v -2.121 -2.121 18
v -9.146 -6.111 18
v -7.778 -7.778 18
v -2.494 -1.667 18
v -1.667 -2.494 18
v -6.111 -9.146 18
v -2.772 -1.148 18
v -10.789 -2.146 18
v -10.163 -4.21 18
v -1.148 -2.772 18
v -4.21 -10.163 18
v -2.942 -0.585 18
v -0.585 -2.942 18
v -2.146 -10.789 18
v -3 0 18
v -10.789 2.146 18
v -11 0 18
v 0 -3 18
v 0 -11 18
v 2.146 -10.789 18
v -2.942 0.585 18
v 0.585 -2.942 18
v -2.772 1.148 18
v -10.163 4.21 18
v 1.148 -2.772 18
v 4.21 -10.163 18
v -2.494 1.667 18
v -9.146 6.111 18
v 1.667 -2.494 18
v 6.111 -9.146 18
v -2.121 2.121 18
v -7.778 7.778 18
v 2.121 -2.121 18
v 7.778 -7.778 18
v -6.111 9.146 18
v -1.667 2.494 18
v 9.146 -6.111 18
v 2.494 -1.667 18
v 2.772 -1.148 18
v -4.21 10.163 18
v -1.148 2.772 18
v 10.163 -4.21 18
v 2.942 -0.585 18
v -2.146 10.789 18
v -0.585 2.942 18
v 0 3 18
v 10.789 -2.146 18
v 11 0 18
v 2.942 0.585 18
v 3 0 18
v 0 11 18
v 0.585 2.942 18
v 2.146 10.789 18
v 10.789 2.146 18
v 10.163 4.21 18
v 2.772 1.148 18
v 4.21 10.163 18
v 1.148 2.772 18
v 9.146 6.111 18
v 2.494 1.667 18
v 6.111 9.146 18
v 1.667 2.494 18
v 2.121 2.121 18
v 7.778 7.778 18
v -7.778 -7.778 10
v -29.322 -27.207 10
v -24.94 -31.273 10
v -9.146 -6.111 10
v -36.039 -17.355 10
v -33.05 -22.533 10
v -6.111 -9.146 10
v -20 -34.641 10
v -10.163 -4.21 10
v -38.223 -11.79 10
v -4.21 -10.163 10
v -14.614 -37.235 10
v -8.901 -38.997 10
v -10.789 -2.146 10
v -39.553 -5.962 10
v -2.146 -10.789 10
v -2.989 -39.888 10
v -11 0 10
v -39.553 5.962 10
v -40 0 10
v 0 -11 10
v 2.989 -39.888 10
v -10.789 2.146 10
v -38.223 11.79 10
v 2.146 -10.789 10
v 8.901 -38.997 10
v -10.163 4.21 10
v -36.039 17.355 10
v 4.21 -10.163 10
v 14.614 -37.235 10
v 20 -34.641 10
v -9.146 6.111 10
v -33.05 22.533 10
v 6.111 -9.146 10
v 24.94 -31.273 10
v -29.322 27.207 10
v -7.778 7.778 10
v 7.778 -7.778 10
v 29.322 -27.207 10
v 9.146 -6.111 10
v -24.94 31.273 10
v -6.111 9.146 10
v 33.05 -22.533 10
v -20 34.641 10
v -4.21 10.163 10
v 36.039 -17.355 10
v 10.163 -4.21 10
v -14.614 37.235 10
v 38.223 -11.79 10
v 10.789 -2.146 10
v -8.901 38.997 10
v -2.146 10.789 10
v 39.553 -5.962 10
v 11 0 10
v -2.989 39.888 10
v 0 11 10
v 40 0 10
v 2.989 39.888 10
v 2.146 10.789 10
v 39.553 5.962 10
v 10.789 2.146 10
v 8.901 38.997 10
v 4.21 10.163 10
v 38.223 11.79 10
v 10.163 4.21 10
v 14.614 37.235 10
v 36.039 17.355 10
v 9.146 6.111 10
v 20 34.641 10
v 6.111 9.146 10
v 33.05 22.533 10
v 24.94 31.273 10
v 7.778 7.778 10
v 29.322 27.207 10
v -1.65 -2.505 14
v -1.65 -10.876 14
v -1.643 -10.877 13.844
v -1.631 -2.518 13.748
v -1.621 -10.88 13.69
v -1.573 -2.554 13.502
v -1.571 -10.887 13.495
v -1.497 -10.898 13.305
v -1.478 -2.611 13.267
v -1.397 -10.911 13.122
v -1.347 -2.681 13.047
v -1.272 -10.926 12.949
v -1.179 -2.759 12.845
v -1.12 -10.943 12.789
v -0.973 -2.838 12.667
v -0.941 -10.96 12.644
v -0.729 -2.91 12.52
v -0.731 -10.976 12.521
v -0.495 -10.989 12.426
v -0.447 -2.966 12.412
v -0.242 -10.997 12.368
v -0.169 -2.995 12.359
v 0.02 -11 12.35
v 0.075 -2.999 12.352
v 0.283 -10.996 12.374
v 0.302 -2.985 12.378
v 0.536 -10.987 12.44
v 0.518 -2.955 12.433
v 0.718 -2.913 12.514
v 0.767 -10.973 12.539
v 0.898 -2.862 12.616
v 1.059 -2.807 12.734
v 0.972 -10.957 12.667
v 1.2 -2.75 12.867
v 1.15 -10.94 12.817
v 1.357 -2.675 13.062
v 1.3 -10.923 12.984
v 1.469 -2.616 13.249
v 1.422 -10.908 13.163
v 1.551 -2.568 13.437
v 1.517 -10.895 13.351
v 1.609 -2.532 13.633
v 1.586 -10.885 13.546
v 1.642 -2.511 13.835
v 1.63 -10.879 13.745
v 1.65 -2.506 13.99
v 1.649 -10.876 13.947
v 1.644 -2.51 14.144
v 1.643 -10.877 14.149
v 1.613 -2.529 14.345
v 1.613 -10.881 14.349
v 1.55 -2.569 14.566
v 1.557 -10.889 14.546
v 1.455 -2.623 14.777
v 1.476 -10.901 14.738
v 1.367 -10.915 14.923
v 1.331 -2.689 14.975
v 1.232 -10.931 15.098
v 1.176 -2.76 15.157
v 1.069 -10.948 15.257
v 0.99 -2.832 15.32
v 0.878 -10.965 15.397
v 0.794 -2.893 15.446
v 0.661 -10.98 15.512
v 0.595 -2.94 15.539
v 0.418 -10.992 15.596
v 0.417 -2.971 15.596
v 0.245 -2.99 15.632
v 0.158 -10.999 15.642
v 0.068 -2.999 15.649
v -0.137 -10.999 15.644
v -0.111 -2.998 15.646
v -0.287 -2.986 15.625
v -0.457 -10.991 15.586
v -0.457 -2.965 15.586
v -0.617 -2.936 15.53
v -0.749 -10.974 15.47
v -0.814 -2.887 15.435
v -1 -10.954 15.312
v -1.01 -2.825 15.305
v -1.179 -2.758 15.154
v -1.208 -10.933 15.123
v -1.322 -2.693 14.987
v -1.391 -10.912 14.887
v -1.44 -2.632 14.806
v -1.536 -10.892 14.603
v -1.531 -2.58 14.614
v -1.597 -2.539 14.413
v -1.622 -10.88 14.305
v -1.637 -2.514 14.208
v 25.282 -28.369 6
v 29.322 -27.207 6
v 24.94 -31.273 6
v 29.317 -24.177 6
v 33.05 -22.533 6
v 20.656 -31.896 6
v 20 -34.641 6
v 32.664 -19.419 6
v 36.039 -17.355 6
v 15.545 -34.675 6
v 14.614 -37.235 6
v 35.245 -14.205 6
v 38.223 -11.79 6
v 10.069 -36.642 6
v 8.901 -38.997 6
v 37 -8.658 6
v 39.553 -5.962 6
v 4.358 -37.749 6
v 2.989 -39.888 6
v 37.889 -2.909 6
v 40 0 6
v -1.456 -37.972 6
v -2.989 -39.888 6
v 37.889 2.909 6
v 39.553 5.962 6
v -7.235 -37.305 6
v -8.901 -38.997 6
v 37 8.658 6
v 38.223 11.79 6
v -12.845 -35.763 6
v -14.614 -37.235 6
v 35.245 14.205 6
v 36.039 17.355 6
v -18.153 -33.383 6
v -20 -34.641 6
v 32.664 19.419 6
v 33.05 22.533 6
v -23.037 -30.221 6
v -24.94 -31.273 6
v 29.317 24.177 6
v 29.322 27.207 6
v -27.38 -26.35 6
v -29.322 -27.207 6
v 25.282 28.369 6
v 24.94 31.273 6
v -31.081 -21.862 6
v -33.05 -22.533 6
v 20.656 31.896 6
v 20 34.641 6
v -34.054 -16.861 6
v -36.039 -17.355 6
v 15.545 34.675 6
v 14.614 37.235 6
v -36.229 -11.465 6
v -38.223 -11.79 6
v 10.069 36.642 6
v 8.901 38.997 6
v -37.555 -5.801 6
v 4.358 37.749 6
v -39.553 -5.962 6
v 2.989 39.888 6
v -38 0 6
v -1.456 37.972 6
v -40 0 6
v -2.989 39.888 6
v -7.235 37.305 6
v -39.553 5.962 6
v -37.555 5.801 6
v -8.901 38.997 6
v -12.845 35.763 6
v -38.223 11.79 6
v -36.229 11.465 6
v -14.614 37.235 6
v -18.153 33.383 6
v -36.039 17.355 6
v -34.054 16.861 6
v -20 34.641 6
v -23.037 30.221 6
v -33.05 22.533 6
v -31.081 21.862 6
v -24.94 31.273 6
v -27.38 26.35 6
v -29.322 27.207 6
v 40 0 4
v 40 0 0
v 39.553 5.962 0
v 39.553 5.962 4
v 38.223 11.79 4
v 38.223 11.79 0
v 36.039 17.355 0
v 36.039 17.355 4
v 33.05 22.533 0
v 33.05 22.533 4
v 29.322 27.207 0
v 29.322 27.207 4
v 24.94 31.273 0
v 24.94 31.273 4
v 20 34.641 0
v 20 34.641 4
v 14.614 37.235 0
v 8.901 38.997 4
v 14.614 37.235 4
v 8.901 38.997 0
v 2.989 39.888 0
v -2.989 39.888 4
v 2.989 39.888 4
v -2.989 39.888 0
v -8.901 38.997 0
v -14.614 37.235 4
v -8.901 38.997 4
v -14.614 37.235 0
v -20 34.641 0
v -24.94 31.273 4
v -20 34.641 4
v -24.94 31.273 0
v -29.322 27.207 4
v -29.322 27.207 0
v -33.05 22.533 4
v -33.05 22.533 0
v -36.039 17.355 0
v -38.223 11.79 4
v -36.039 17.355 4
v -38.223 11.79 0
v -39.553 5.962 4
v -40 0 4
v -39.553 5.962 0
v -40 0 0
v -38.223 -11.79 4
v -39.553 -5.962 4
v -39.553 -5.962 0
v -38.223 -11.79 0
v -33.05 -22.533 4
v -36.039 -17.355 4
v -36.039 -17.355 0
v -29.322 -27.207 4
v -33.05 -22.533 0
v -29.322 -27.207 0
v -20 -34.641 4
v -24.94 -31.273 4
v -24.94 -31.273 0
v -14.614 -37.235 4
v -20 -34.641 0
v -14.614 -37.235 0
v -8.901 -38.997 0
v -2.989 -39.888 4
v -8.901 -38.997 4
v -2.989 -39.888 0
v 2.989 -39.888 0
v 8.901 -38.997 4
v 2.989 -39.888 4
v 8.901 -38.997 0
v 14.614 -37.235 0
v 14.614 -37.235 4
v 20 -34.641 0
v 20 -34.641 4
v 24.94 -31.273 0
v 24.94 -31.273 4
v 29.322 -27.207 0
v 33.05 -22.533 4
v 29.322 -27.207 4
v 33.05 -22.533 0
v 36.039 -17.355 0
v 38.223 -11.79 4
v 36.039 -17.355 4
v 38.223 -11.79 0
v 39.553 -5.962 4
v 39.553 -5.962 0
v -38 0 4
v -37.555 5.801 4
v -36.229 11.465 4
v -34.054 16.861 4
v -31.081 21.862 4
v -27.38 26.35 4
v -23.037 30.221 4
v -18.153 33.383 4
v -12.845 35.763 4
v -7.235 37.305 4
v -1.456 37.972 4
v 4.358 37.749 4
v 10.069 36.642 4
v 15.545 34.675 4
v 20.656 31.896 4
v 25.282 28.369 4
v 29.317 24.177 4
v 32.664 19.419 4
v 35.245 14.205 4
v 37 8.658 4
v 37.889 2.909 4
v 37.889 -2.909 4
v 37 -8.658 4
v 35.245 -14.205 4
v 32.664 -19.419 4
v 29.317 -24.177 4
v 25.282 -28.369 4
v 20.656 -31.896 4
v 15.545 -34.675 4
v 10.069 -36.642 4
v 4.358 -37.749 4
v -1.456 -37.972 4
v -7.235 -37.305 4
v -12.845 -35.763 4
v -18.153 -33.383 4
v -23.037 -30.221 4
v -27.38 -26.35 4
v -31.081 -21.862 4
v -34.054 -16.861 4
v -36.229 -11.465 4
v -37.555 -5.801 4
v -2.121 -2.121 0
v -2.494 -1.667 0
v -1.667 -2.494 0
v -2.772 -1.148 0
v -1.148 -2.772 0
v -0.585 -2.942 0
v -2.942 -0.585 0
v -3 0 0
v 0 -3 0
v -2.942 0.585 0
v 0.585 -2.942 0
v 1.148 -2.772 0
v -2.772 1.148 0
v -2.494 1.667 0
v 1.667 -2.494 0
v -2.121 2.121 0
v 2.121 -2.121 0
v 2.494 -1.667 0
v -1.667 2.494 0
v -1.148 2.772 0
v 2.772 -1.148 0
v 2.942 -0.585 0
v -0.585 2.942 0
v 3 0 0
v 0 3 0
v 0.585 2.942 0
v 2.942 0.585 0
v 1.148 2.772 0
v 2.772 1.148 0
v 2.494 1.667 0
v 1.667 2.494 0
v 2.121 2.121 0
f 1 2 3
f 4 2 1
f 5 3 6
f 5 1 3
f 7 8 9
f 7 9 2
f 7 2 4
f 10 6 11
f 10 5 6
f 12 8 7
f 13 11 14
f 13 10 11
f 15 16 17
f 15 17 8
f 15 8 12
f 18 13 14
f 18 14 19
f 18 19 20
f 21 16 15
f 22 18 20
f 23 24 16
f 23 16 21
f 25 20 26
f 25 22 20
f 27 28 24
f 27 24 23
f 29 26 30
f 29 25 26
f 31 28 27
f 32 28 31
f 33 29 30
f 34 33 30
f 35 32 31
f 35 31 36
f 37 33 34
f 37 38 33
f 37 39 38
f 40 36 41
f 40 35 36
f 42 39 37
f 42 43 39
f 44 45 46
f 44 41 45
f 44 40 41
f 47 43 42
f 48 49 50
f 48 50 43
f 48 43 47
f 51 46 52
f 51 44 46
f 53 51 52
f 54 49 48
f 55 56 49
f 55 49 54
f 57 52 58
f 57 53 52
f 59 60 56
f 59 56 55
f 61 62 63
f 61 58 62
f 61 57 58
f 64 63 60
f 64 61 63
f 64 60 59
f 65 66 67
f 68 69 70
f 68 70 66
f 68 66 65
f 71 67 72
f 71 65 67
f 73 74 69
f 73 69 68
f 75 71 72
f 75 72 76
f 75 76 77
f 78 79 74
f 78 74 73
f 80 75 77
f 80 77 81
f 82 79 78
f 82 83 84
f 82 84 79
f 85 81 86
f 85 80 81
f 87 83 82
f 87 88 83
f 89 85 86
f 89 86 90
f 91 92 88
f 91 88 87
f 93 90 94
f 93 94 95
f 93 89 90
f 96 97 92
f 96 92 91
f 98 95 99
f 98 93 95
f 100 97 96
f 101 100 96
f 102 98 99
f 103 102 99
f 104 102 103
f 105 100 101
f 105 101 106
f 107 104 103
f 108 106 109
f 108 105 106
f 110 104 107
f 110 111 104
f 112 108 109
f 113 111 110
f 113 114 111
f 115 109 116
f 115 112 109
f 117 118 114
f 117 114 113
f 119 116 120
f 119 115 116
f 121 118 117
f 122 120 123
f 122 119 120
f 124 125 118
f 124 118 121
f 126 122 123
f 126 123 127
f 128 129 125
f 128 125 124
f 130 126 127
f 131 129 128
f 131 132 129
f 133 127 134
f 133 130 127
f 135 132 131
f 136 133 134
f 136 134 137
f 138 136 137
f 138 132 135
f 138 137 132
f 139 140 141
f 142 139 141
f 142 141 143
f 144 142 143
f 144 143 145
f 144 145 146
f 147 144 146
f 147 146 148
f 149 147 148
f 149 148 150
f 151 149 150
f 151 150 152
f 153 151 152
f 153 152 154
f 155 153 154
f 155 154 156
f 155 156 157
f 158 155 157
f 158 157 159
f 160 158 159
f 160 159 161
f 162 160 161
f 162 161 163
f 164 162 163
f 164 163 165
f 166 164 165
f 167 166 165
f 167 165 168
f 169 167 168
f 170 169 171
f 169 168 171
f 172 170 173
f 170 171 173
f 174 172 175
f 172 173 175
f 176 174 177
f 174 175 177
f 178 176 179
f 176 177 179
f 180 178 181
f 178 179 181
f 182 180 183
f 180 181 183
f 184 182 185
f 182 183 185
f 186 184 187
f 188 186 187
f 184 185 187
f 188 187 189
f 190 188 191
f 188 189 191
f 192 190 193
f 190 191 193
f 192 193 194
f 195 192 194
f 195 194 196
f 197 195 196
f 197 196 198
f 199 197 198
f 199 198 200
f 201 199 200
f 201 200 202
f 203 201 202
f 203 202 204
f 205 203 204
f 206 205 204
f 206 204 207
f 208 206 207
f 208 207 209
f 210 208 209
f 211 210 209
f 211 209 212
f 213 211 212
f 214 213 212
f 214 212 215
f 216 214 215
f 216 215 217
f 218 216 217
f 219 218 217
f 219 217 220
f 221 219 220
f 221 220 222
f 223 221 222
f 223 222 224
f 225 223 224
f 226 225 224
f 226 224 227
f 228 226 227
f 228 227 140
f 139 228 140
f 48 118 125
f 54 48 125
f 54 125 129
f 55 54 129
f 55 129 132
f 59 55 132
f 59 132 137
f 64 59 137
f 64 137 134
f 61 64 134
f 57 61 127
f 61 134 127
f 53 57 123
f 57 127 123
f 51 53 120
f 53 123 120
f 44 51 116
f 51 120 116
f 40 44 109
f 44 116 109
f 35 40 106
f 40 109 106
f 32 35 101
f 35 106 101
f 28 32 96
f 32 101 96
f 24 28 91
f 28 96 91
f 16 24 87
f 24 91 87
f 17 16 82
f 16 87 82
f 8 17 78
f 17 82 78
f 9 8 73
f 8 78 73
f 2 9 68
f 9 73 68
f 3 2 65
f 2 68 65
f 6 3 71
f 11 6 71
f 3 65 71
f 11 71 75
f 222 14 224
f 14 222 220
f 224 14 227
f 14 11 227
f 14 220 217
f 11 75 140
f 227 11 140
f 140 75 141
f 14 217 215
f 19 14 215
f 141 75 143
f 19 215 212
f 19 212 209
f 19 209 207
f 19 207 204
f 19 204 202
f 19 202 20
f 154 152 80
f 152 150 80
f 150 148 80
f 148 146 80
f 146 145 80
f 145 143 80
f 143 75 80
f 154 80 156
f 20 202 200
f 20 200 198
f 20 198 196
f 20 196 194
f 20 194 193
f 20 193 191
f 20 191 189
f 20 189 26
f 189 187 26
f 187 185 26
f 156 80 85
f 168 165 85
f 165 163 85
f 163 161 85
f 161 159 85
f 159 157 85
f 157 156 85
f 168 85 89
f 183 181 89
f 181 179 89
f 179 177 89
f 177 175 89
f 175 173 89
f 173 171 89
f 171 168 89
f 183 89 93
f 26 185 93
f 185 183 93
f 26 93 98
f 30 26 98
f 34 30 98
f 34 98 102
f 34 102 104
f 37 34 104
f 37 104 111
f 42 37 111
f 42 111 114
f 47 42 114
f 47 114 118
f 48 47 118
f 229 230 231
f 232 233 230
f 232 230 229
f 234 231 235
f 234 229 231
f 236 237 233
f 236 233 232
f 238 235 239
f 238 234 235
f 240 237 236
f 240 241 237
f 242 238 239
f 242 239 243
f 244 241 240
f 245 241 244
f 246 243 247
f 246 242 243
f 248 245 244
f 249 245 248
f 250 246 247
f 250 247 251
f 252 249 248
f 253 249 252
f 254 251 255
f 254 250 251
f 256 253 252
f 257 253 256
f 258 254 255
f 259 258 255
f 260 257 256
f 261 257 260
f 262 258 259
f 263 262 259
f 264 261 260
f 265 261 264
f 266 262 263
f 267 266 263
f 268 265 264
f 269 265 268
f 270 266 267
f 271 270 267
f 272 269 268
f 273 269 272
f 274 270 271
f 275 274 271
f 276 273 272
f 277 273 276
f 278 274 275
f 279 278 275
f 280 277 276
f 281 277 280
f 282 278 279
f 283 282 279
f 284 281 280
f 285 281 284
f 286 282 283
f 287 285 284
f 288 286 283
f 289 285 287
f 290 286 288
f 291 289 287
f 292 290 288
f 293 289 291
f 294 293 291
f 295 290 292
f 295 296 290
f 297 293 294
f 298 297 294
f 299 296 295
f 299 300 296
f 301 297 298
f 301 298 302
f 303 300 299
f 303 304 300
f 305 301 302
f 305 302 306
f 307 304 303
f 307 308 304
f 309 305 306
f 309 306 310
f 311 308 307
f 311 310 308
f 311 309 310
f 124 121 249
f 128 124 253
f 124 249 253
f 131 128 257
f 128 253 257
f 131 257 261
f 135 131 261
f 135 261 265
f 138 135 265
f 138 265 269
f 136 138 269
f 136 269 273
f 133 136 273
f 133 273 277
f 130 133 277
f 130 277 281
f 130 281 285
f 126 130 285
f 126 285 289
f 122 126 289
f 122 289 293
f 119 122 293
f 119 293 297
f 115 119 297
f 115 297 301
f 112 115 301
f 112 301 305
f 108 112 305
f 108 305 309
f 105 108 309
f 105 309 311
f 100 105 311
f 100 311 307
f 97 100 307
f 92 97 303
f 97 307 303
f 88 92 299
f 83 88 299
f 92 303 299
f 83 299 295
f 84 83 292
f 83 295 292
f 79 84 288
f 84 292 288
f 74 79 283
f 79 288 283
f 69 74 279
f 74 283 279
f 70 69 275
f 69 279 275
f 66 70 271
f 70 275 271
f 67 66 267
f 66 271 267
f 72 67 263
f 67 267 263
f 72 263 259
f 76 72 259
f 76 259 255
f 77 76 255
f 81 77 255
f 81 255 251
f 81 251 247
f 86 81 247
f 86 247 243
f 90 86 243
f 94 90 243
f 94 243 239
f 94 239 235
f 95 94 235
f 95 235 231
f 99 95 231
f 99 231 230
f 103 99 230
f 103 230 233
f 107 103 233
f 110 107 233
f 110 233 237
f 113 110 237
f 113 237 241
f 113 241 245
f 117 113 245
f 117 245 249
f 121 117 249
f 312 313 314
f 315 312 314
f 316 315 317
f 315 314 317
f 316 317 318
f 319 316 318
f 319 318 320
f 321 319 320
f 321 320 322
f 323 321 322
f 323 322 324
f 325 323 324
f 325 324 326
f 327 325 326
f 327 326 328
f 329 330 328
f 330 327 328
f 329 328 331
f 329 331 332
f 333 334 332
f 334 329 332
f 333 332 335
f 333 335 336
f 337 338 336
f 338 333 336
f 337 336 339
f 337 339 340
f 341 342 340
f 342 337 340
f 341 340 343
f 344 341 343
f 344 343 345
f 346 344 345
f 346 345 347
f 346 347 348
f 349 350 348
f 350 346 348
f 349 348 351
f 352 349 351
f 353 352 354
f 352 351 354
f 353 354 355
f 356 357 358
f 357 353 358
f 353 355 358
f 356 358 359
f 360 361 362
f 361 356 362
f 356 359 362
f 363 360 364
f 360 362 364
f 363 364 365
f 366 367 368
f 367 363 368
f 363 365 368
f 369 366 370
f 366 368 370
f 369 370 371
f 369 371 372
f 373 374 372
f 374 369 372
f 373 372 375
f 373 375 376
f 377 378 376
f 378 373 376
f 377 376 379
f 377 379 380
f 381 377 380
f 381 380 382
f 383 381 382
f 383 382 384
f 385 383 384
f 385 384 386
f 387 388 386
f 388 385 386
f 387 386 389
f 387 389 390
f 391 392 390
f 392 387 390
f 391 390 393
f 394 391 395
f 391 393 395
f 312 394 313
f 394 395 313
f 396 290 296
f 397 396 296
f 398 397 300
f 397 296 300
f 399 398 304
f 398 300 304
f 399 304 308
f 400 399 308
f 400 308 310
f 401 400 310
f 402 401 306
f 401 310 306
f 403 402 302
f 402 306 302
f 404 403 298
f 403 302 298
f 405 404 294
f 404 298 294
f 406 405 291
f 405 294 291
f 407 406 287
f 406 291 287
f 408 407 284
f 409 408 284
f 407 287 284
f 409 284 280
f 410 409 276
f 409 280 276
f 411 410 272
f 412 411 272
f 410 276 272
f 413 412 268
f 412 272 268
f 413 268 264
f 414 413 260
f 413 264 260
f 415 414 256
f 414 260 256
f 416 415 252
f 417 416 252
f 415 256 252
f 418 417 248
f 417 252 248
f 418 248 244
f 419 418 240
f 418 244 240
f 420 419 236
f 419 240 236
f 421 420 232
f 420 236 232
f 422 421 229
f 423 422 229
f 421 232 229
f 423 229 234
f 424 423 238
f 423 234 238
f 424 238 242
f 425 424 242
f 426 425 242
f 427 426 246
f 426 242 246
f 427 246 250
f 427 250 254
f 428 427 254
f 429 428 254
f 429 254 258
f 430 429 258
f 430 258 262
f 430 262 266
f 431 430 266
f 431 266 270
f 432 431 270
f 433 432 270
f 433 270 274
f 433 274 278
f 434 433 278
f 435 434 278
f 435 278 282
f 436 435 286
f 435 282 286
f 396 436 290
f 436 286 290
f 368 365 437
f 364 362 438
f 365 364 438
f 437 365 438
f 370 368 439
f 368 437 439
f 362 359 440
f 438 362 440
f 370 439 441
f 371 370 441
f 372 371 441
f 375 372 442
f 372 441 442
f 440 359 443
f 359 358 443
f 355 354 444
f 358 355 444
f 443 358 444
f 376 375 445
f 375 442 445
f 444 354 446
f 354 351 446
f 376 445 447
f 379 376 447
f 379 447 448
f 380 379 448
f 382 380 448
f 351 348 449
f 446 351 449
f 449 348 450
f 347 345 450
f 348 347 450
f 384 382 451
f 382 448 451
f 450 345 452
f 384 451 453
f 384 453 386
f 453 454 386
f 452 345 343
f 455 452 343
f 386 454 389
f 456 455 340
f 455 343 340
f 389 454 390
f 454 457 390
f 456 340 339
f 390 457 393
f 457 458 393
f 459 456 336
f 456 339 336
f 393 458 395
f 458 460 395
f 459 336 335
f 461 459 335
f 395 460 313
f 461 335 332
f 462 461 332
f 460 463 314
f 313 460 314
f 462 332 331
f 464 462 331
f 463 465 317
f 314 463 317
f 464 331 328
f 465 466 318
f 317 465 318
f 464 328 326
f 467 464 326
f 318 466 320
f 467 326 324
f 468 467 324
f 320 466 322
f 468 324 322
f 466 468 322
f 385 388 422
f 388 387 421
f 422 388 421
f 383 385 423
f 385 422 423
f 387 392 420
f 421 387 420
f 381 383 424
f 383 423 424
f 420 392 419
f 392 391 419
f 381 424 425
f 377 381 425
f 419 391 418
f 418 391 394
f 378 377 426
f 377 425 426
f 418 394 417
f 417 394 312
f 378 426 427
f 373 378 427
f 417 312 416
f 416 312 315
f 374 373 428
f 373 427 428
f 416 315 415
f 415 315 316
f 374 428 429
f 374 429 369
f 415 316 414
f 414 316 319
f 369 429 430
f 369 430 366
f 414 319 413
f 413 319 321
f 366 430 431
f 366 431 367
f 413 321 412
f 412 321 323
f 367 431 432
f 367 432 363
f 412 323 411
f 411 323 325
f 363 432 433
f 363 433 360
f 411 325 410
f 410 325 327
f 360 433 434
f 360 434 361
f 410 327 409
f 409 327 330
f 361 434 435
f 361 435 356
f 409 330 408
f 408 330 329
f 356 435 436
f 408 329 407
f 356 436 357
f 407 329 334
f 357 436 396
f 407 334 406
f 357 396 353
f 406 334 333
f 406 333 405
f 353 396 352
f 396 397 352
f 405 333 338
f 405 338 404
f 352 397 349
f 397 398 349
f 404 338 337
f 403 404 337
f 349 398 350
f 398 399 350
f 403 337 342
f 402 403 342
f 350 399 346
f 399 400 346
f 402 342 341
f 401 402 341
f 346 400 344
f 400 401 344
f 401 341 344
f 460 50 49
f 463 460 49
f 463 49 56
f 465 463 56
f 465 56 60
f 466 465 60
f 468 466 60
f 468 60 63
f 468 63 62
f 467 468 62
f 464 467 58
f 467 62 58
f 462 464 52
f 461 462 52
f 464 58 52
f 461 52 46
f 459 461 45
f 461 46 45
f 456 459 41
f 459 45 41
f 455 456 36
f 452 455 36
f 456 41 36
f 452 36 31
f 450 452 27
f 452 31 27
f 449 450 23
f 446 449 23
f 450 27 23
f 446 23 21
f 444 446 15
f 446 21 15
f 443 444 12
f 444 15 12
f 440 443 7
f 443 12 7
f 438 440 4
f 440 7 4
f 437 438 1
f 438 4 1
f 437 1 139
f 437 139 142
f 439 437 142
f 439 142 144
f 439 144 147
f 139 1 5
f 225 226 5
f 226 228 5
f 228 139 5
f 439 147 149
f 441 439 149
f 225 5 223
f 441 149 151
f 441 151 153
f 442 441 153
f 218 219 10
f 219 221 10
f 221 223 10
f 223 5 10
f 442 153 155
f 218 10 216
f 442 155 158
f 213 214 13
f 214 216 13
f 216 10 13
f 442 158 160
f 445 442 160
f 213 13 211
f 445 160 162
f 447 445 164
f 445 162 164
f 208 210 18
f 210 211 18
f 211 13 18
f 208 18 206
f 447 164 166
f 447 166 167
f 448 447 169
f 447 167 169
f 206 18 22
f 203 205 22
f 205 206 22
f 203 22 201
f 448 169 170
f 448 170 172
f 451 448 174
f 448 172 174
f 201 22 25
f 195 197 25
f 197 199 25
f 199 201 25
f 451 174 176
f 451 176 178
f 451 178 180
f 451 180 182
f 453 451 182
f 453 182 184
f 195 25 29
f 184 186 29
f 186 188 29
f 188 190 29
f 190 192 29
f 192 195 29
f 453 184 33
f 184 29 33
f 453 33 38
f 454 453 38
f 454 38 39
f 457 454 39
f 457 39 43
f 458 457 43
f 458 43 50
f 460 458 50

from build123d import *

# Parameters (mm, degrees)
SKETCH_1_R               = 40
EXTRUDE_1_DEPTH          = 10
SKETCH_2_R               = 11
EXTRUDE_2_DEPTH          = 8
SKETCH_3_R               = 3
CUT_EXTRUDE_1_DEPTH      = 60.363288319
M4X0_7_1_REACH           = 68.31
M4X0_7_1_BORE_R          = 1.65
CUT_EXTRUDE_2_DEPTH      = 1
CUT_EXTRUDE_2_DEPTH_BACK = 1
SKETCH_5_OUTSIDE_W       = 104.912
SKETCH_5_OUTSIDE_H       = 104.912
SKETCH_5_OUTSIDE_R       = 38


with BuildPart() as part:
    # ｽｹｯﾁ1 → ﾎﾞｽ - 押し出し1 (new body)
    with BuildSketch(Plane.XY):
        Circle(SKETCH_1_R)
    extrude(amount=EXTRUDE_1_DEPTH)

    # ｽｹｯﾁ2 → ﾎﾞｽ - 押し出し2 (add)
    with BuildSketch(Plane.XY.offset(10)):
        Circle(SKETCH_2_R)
    extrude(amount=EXTRUDE_2_DEPTH)

    # ｽｹｯﾁ3 → ｶｯﾄ - 押し出し1 (cut, through all)
    with BuildSketch(Plane.XY.offset(18)):
        Circle(SKETCH_3_R)
    extrude(amount=-CUT_EXTRUDE_1_DEPTH, mode=Mode.SUBTRACT)

    # M4x0.7 ねじ穴1 bore (on position points) → M4x0.7 ねじ穴1 (cut, up to next)
    with BuildSketch(Plane(origin=(0, -11, 14), x_dir=(-1, 0, 0), z_dir=(0, -1, 0)), mode=Mode.PRIVATE) as m4x0_7_1_sk1:
        Circle(M4X0_7_1_BORE_R)
    m4x0_7_1_tool1 = extrude(m4x0_7_1_sk1.sketch, amount=-M4X0_7_1_REACH, mode=Mode.PRIVATE) & part.part
    add(m4x0_7_1_tool1.solids().sort_by_distance((0, -11, 14))[0], mode=Mode.SUBTRACT)

    # ｽｹｯﾁ5 outside → ｶｯﾄ - 押し出し2 (cut, two sides: drawn at the far end of the back side and taken through both)
    with BuildSketch(Plane(origin=(0, 0, 5), x_dir=(-1, 0, 0), z_dir=(0, 0, -1)).offset(-CUT_EXTRUDE_2_DEPTH_BACK)):
        Rectangle(SKETCH_5_OUTSIDE_W, SKETCH_5_OUTSIDE_H)
        Circle(SKETCH_5_OUTSIDE_R, mode=Mode.SUBTRACT)
    extrude(amount=CUT_EXTRUDE_2_DEPTH + CUT_EXTRUDE_2_DEPTH_BACK, mode=Mode.SUBTRACT)


solid = part.part
